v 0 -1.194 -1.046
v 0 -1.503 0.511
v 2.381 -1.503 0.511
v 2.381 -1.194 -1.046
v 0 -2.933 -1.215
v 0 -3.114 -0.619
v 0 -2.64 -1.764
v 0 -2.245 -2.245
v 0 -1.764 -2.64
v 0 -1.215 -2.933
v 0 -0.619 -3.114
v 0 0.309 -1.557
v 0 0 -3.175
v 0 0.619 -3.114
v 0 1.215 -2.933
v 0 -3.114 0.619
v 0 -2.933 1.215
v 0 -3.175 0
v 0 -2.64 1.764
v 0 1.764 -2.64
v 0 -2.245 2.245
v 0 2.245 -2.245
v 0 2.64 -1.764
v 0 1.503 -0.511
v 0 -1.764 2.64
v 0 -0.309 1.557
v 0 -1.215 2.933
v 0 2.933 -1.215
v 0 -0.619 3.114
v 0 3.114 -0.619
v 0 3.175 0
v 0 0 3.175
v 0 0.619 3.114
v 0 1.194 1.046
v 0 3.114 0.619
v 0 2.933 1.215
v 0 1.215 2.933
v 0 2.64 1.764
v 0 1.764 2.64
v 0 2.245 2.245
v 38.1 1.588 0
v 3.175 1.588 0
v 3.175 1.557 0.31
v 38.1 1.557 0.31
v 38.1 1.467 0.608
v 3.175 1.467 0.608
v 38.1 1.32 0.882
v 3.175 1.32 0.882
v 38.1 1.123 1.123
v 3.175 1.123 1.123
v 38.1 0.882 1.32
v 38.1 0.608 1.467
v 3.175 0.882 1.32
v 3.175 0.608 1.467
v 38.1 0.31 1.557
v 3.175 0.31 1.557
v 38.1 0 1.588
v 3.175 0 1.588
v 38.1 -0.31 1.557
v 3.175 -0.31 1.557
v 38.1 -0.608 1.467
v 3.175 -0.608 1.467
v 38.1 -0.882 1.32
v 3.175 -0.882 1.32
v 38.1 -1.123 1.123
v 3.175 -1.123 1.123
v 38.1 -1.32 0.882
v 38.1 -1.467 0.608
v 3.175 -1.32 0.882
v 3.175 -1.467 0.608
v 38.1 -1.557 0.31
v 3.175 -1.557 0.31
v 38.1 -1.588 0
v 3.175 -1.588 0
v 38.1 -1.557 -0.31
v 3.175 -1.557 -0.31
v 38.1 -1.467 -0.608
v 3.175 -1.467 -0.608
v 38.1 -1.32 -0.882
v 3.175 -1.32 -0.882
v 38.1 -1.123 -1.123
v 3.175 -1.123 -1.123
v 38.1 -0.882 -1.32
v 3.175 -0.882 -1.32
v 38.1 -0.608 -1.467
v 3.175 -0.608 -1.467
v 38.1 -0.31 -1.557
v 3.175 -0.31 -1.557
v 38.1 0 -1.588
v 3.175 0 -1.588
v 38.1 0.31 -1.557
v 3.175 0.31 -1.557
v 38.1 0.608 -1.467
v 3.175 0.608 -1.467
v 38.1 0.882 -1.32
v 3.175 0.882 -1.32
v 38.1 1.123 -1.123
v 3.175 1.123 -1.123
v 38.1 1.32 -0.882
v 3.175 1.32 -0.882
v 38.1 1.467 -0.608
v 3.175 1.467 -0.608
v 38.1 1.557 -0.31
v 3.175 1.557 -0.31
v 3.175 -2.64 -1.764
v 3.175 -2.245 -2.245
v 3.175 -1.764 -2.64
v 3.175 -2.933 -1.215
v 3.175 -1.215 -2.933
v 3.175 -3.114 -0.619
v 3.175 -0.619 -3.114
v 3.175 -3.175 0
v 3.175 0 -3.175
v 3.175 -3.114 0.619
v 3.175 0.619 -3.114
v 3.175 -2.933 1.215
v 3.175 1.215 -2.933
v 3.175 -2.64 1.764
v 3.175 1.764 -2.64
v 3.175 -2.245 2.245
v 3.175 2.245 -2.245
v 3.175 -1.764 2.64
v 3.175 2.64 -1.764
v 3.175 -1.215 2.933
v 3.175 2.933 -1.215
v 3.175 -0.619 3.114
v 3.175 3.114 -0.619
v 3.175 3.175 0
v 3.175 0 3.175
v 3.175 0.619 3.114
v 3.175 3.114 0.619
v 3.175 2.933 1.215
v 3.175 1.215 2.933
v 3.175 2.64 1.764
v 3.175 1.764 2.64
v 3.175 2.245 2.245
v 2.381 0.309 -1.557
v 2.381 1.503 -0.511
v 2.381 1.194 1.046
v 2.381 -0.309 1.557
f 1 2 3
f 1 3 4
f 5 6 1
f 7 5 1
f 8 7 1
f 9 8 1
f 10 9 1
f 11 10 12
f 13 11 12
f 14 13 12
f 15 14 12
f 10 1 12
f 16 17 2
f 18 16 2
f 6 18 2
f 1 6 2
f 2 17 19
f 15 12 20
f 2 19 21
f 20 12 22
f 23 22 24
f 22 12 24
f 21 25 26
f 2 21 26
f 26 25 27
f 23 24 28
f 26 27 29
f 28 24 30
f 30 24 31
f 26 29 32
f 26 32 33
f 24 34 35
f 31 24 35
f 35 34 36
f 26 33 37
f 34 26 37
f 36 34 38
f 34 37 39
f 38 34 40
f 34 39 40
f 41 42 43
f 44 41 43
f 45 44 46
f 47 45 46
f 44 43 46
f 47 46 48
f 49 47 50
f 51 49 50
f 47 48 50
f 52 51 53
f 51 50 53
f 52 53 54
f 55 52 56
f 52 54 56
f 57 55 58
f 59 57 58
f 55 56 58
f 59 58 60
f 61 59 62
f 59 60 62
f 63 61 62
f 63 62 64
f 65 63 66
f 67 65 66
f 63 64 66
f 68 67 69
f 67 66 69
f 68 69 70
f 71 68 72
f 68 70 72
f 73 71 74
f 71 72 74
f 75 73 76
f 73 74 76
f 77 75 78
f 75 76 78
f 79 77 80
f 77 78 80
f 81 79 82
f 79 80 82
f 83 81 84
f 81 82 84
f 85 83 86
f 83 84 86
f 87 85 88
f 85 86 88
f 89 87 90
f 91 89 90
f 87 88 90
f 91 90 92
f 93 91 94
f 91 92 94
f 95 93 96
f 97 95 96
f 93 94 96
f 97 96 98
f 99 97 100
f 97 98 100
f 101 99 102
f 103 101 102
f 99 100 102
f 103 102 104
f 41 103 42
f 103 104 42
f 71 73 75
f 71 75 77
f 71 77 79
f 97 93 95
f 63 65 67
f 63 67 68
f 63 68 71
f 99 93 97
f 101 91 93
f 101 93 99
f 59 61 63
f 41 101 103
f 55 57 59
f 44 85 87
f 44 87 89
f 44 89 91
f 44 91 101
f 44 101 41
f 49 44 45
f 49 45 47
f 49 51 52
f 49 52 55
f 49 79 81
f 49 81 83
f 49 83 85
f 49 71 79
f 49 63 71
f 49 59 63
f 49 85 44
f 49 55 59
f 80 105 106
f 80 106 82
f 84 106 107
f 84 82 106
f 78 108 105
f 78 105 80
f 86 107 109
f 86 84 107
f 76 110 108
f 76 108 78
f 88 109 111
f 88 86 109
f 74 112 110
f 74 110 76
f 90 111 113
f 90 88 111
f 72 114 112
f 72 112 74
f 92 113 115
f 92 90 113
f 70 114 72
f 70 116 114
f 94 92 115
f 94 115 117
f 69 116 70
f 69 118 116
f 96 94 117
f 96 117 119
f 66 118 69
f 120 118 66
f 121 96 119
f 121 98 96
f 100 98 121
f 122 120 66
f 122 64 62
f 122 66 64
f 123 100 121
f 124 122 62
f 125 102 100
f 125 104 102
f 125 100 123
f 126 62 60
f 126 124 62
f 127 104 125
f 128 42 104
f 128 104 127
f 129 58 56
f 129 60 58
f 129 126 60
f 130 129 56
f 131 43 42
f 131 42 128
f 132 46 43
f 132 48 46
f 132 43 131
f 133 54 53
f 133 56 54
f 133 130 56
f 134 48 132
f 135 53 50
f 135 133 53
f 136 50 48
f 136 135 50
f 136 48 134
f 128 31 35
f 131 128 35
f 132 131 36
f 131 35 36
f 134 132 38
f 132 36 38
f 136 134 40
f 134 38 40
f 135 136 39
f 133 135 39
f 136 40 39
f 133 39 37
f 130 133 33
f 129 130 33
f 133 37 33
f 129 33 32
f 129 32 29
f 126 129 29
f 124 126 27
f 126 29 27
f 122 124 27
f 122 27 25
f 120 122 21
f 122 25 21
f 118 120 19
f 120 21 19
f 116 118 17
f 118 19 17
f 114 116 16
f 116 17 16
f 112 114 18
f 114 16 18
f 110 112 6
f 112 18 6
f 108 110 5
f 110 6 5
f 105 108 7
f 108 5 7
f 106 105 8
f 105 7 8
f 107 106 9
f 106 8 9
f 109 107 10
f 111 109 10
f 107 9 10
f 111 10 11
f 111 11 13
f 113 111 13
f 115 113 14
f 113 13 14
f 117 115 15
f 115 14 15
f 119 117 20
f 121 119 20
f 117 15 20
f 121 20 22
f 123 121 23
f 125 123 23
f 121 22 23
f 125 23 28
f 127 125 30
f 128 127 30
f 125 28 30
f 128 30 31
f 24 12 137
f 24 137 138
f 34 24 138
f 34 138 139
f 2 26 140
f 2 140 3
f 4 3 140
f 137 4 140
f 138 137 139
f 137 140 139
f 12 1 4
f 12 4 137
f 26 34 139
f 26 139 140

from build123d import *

# Parameters (mm, degrees)
F0_R     = 3.175
F1_DEPTH = 3.175
F2_R     = 1.5875
F3_DEPTH = 34.925
F4_DEPTH = 2.38125


with BuildPart() as f1:
    # F0 (on Right) → F1 (new body)
    with BuildSketch(Plane.YZ):
        Circle(F0_R)
        Polygon((1.193802, 1.046419), (1.503127, -0.510653), (0.309325, -1.557072), (-1.193802, -1.046419), (-1.503127, 0.510653), (-0.309325, 1.557072), align=None, mode=Mode.SUBTRACT)
        Polygon((0.309325, -1.557072), (1.503127, -0.510653), (1.193802, 1.046419), (-0.309325, 1.557072), (-1.503127, 0.510653), (-1.193802, -1.046419), align=None)
    extrude(amount=F1_DEPTH)

    # F2 (on face) → F3 (join)
    with BuildSketch(Plane.YZ.offset(3.175)):
        Circle(F2_R)
    extrude(amount=F3_DEPTH)

    # F0 (on Right) → F4 (cut)
    with BuildSketch(Plane.YZ):
        Polygon((0.309325, -1.557072), (1.503127, -0.510653), (1.193802, 1.046419), (-0.309325, 1.557072), (-1.503127, 0.510653), (-1.193802, -1.046419), align=None)
    extrude(amount=F4_DEPTH, mode=Mode.SUBTRACT)


solid = f1.part
